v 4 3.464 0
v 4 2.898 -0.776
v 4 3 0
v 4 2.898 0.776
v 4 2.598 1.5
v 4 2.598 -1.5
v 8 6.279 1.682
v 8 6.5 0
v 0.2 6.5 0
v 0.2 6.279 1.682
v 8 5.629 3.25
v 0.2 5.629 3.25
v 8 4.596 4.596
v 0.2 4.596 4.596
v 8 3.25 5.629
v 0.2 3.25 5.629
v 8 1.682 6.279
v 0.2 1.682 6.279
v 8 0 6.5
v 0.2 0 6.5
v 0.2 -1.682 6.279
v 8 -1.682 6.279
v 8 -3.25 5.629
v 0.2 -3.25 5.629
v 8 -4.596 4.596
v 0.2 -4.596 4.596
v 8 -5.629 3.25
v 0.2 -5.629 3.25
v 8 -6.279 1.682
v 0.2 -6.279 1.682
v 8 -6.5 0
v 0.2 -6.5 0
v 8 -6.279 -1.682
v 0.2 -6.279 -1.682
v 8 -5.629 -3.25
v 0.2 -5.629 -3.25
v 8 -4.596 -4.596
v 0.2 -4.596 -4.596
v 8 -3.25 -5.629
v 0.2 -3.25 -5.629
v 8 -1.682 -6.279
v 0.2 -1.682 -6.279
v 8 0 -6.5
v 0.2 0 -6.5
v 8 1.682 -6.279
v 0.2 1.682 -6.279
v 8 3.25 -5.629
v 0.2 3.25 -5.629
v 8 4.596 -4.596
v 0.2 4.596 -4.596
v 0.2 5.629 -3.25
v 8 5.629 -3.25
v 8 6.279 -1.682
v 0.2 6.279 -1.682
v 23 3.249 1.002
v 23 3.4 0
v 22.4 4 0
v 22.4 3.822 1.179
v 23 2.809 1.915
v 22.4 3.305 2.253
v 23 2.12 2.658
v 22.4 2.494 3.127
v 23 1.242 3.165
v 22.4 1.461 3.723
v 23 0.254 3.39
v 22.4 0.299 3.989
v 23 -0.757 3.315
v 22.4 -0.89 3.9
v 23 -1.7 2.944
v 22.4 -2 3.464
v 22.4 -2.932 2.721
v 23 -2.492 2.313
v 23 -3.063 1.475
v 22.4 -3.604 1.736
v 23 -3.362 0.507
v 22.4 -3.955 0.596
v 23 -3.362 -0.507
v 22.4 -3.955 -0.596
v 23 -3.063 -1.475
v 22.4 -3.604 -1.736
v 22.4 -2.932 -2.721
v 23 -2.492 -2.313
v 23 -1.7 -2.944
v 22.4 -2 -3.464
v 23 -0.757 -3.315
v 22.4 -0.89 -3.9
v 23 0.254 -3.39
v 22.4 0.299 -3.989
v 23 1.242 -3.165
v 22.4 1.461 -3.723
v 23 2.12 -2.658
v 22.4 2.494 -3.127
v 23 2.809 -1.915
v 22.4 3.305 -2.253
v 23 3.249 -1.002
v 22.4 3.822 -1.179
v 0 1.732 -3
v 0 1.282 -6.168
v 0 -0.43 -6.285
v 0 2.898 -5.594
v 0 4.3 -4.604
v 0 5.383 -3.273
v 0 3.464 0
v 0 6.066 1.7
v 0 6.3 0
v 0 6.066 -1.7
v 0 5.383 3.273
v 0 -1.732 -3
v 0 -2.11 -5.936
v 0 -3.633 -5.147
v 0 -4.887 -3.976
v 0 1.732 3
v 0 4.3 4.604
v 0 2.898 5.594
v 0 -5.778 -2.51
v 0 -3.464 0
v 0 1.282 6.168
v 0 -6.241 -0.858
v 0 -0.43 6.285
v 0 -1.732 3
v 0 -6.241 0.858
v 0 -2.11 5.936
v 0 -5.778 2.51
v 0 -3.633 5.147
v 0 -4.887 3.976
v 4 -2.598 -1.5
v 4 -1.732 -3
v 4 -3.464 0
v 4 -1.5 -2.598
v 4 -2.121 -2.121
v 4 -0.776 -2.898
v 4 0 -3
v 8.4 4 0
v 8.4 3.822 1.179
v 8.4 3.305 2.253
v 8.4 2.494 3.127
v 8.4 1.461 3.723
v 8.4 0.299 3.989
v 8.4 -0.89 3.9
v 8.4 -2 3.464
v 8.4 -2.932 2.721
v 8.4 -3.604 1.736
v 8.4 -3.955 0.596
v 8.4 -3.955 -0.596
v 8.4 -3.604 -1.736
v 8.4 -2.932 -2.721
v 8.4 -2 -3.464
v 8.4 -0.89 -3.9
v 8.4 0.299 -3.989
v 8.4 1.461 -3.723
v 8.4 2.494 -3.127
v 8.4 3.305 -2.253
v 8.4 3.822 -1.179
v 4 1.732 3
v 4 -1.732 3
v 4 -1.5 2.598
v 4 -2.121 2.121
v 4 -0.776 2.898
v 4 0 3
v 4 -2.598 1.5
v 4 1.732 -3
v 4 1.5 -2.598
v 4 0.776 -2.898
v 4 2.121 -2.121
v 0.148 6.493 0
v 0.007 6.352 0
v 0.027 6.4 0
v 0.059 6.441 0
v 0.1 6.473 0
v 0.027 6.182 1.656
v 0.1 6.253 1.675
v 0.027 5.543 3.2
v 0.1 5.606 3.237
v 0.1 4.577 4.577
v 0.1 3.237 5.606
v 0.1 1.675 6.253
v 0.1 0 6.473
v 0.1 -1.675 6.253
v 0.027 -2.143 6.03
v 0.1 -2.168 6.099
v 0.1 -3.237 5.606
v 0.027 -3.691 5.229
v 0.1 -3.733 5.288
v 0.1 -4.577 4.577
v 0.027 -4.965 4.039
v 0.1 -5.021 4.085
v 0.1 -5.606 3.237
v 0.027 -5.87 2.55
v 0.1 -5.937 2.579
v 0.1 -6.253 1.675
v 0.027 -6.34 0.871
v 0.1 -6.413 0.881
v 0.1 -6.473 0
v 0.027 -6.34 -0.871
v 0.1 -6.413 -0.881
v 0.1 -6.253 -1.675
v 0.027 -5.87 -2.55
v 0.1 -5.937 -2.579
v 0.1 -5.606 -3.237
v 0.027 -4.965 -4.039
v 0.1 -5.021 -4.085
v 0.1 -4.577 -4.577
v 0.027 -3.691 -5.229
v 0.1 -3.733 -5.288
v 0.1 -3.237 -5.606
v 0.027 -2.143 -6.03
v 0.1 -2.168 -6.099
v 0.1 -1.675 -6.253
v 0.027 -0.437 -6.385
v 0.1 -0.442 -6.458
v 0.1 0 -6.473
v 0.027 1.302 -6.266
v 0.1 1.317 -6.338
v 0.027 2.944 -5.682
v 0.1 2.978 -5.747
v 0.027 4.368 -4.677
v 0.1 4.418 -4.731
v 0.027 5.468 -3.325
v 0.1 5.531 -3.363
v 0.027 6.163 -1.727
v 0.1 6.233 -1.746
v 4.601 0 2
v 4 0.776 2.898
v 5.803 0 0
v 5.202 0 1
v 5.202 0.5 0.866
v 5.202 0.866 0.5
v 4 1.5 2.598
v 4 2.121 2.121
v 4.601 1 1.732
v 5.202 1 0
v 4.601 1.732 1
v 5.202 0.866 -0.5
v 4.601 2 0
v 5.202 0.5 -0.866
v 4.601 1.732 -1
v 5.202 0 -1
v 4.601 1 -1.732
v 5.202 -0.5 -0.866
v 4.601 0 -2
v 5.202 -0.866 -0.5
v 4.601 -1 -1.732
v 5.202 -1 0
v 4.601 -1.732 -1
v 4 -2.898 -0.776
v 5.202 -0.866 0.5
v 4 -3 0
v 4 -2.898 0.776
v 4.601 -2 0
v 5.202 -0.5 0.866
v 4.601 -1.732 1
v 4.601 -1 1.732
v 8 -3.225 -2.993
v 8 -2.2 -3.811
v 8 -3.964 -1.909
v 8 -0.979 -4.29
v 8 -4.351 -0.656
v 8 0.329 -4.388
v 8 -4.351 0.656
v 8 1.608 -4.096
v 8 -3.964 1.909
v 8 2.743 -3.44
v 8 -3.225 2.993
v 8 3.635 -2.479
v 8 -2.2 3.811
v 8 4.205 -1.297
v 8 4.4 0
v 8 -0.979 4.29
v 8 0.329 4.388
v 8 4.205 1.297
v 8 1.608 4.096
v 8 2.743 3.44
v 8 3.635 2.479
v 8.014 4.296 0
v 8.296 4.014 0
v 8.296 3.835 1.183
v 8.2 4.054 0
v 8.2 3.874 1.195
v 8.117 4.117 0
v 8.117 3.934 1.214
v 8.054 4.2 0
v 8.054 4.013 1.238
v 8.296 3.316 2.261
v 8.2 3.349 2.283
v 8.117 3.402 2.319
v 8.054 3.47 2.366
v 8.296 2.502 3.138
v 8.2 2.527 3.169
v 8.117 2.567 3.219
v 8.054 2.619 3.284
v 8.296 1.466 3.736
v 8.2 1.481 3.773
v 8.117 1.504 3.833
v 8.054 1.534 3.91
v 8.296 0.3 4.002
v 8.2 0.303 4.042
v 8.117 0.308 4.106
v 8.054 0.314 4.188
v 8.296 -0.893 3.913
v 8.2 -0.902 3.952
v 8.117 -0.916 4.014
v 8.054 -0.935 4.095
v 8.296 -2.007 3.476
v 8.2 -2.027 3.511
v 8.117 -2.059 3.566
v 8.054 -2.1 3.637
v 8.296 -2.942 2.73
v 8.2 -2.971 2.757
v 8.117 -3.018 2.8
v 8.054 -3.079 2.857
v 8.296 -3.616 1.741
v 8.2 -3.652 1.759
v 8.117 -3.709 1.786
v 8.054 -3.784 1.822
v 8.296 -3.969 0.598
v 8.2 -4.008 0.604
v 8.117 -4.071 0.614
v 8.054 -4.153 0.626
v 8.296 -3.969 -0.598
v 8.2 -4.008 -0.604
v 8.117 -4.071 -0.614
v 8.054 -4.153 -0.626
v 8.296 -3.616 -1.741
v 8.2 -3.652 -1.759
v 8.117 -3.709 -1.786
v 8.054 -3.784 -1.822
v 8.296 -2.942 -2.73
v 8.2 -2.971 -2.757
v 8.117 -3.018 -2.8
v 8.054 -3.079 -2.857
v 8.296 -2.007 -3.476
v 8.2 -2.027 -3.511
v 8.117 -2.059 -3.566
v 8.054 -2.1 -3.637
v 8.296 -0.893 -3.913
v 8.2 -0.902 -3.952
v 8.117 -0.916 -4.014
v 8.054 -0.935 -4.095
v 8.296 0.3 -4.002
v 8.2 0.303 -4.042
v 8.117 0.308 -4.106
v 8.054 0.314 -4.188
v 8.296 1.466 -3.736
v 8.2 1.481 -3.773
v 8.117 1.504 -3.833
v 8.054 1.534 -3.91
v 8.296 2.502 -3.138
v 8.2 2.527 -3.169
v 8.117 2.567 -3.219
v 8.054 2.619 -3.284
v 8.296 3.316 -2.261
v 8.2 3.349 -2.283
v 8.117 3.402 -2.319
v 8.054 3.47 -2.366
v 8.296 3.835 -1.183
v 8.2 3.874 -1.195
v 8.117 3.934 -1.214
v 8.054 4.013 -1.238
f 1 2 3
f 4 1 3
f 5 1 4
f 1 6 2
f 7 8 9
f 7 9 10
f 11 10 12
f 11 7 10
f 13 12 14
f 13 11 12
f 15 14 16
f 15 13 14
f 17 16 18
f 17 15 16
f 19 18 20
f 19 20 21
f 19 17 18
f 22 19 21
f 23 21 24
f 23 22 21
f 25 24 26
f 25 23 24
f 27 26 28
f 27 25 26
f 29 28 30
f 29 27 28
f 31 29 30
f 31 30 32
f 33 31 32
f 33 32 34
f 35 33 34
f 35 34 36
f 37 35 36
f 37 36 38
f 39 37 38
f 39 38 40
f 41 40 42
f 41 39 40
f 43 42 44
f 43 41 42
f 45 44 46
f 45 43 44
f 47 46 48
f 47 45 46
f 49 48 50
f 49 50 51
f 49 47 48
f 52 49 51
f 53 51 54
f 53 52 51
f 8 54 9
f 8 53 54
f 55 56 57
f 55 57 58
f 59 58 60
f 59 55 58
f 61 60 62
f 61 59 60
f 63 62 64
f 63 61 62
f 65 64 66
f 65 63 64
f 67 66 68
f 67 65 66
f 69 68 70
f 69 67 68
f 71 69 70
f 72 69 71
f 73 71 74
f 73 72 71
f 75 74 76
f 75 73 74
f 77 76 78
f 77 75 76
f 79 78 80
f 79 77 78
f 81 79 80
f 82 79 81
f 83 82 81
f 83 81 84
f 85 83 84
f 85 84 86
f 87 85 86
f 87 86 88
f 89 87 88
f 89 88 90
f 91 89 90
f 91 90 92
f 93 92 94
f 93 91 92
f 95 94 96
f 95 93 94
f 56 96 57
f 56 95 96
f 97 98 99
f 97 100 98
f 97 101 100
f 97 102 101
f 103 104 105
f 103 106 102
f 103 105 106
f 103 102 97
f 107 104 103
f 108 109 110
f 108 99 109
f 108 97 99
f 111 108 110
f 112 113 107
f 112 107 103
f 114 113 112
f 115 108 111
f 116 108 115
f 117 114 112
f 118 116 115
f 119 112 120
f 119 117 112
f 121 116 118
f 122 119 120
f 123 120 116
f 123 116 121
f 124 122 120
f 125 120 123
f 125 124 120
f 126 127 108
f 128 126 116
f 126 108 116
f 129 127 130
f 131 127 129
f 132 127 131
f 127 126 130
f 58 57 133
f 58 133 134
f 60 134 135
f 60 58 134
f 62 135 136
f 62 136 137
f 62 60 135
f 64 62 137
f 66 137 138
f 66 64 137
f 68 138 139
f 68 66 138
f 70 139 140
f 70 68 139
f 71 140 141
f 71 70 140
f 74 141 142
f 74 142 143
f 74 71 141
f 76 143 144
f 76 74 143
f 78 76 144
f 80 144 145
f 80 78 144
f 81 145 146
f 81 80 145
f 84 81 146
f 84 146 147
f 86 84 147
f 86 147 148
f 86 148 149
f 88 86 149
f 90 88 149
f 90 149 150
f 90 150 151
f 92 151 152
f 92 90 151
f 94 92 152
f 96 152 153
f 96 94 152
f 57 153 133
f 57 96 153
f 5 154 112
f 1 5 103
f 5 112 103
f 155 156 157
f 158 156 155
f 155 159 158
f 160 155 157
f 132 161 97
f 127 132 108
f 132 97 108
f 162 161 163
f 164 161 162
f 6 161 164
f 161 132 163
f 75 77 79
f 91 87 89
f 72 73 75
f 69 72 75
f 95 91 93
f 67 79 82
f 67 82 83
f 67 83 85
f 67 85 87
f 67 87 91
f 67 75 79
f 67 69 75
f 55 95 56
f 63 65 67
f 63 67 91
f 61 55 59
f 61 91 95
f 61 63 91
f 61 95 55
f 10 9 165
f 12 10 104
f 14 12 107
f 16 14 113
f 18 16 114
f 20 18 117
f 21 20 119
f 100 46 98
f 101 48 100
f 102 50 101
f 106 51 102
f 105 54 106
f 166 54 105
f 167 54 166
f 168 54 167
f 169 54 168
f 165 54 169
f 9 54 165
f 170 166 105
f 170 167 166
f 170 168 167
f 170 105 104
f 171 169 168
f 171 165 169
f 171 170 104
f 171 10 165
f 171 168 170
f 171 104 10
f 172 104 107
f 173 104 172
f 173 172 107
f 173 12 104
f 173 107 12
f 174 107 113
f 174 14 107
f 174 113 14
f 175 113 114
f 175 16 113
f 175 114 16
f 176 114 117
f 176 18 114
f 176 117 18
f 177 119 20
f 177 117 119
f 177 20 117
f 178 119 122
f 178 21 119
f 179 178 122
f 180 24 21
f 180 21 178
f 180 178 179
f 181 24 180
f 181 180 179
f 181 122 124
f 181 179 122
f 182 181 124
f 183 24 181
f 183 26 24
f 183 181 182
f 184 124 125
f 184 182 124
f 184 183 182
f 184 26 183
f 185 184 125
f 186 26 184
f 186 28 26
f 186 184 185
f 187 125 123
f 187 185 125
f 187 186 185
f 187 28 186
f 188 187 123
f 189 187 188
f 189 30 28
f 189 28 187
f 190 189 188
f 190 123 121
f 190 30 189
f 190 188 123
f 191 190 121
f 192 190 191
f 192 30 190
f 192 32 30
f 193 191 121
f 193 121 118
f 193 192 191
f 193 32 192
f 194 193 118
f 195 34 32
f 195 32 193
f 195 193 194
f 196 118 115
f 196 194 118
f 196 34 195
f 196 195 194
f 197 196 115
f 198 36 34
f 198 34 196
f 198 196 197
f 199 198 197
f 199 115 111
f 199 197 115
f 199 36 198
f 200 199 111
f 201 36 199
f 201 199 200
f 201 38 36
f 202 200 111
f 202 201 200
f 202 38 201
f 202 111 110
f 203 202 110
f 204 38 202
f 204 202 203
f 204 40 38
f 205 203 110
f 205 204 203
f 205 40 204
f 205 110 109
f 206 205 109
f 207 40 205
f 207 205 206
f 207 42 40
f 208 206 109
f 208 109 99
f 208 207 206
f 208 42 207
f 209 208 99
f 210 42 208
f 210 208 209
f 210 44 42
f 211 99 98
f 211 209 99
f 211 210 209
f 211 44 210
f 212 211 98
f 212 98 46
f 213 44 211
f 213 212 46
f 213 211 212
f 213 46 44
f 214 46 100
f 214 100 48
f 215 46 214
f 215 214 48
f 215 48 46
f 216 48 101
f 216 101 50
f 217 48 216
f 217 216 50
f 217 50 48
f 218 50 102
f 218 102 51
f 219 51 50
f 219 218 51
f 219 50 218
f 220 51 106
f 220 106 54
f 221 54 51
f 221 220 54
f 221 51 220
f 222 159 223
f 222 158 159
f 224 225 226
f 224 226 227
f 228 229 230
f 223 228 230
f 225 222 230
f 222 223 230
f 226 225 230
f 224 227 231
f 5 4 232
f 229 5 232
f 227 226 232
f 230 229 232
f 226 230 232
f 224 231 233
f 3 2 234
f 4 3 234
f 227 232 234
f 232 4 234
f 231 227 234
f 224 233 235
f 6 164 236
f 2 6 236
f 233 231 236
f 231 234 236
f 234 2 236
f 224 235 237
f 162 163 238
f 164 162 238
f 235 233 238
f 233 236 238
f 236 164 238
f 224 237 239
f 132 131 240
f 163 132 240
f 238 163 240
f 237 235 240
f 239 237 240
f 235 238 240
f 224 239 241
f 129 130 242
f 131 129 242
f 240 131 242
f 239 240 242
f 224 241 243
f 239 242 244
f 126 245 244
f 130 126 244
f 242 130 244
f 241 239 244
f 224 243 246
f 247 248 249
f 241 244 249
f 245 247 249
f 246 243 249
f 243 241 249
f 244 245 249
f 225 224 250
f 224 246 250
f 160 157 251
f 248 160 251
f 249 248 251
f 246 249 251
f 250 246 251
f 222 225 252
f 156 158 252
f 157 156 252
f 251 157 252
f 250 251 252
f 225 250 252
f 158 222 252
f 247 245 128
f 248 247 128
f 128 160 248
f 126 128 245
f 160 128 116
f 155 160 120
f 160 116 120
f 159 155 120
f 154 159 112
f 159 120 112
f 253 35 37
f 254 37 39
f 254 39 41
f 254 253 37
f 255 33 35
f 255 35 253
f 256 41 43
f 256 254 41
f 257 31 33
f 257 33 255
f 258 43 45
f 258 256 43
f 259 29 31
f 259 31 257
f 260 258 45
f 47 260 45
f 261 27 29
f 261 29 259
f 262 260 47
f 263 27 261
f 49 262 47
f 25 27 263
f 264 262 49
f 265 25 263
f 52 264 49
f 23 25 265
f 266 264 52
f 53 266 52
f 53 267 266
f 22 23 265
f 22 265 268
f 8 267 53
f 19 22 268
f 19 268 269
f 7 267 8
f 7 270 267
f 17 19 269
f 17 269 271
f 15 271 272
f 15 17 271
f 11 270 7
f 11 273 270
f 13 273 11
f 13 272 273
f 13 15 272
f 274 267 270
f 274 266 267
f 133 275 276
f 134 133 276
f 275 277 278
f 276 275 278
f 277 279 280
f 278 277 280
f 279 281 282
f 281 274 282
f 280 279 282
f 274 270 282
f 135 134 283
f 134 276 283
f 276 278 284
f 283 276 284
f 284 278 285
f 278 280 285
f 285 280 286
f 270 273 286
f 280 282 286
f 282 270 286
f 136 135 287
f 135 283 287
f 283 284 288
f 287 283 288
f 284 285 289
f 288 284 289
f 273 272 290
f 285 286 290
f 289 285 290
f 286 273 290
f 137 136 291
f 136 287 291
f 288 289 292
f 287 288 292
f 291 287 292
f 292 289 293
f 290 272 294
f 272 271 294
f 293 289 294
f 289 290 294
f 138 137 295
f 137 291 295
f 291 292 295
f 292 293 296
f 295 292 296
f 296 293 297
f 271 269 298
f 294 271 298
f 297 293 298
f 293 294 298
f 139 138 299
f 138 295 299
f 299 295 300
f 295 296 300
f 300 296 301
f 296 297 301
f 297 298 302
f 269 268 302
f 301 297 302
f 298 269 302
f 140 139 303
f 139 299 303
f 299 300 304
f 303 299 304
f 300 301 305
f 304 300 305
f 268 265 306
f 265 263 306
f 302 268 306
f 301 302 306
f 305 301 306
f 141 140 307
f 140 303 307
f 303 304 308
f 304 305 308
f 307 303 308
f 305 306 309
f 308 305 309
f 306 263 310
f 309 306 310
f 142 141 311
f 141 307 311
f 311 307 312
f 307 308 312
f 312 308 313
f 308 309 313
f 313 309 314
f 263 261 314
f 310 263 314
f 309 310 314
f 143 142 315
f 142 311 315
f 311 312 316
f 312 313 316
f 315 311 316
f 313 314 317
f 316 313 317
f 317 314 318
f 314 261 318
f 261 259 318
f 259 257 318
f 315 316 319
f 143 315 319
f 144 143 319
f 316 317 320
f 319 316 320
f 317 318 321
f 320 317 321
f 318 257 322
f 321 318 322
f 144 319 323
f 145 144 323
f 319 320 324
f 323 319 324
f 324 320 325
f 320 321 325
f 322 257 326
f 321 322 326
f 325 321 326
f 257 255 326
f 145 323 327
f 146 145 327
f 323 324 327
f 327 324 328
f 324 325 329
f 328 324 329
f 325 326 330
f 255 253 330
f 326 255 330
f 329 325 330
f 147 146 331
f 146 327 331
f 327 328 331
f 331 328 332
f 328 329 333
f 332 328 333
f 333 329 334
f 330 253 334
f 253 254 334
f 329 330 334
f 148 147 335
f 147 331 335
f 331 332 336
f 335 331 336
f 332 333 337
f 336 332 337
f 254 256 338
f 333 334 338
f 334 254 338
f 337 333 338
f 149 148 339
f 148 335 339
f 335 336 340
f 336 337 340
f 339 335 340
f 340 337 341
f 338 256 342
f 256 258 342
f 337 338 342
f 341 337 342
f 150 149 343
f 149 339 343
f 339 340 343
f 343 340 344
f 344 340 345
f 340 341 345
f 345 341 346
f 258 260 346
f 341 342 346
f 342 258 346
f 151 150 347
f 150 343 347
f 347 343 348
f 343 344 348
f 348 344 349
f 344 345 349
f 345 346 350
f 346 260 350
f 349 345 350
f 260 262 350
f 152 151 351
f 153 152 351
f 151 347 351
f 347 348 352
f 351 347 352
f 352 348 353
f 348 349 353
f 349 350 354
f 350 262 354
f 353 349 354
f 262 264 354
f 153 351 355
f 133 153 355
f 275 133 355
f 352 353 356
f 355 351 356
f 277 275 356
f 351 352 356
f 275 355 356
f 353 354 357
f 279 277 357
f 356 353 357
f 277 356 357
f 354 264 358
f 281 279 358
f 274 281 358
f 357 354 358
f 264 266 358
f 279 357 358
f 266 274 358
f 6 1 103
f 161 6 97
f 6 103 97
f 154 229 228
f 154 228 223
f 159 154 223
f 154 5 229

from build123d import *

# Parameters (mm, degrees)
MM_1_D              = 6
MM_1_DEPTH          = 4
MM_1_TIP            = 1.802581857
CUT_EXTRUDE_1_DEPTH = 4
FILLET_1_R          = 0.2
CHAMFER_1_SIZE      = 0.6
FILLET_2_R          = 0.4


with BuildPart() as part:
    # 草图1 → 旋转1 (revolve)
    with BuildSketch(Plane.XY):
        Polygon((0, 0), (0, 6.5), (8, 6.5), (8, 4), (23, 4), (23, 0), align=None)
    revolve(axis=Axis((0, 0, 0), (1, 0, 0)))

    # 大小mm 暗销孔1
    with Locations(Plane.ZY):
        with Locations((0, 0)):
            Hole(MM_1_D / 2, depth=MM_1_DEPTH)
            with Locations((0, 0, -(MM_1_DEPTH + MM_1_TIP / 2))):  # 118° drill point
                Cone(0, MM_1_D / 2, MM_1_TIP, mode=Mode.SUBTRACT)

    # 草图4 → 切除-拉伸1 (cut)
    with BuildSketch(Plane.ZY):
        Polygon((3, 1.732050808), (0, 3.464101615), (-3, 1.732050808), (-3, -1.732050808), (0, -3.464101615), (3, -1.732050808), align=None)
    extrude(amount=-CUT_EXTRUDE_1_DEPTH, mode=Mode.SUBTRACT)

    # 圆角1
    fillet_1_edges = [part.edges().sort_by_distance(p)[0] for p in [
        (0, -6.5, 0),
    ]]
    fillet(fillet_1_edges, radius=FILLET_1_R)

    # 倒角1
    chamfer_1_edges = [part.edges().sort_by_distance(p)[0] for p in [
        (23, -4, 0),
    ]]
    chamfer(chamfer_1_edges, length=CHAMFER_1_SIZE)

    # 圆角2
    fillet_2_edges = [part.edges().sort_by_distance(p)[0] for p in [
        (8, -4, 0),
    ]]
    fillet(fillet_2_edges, radius=FILLET_2_R)


solid = part.part
